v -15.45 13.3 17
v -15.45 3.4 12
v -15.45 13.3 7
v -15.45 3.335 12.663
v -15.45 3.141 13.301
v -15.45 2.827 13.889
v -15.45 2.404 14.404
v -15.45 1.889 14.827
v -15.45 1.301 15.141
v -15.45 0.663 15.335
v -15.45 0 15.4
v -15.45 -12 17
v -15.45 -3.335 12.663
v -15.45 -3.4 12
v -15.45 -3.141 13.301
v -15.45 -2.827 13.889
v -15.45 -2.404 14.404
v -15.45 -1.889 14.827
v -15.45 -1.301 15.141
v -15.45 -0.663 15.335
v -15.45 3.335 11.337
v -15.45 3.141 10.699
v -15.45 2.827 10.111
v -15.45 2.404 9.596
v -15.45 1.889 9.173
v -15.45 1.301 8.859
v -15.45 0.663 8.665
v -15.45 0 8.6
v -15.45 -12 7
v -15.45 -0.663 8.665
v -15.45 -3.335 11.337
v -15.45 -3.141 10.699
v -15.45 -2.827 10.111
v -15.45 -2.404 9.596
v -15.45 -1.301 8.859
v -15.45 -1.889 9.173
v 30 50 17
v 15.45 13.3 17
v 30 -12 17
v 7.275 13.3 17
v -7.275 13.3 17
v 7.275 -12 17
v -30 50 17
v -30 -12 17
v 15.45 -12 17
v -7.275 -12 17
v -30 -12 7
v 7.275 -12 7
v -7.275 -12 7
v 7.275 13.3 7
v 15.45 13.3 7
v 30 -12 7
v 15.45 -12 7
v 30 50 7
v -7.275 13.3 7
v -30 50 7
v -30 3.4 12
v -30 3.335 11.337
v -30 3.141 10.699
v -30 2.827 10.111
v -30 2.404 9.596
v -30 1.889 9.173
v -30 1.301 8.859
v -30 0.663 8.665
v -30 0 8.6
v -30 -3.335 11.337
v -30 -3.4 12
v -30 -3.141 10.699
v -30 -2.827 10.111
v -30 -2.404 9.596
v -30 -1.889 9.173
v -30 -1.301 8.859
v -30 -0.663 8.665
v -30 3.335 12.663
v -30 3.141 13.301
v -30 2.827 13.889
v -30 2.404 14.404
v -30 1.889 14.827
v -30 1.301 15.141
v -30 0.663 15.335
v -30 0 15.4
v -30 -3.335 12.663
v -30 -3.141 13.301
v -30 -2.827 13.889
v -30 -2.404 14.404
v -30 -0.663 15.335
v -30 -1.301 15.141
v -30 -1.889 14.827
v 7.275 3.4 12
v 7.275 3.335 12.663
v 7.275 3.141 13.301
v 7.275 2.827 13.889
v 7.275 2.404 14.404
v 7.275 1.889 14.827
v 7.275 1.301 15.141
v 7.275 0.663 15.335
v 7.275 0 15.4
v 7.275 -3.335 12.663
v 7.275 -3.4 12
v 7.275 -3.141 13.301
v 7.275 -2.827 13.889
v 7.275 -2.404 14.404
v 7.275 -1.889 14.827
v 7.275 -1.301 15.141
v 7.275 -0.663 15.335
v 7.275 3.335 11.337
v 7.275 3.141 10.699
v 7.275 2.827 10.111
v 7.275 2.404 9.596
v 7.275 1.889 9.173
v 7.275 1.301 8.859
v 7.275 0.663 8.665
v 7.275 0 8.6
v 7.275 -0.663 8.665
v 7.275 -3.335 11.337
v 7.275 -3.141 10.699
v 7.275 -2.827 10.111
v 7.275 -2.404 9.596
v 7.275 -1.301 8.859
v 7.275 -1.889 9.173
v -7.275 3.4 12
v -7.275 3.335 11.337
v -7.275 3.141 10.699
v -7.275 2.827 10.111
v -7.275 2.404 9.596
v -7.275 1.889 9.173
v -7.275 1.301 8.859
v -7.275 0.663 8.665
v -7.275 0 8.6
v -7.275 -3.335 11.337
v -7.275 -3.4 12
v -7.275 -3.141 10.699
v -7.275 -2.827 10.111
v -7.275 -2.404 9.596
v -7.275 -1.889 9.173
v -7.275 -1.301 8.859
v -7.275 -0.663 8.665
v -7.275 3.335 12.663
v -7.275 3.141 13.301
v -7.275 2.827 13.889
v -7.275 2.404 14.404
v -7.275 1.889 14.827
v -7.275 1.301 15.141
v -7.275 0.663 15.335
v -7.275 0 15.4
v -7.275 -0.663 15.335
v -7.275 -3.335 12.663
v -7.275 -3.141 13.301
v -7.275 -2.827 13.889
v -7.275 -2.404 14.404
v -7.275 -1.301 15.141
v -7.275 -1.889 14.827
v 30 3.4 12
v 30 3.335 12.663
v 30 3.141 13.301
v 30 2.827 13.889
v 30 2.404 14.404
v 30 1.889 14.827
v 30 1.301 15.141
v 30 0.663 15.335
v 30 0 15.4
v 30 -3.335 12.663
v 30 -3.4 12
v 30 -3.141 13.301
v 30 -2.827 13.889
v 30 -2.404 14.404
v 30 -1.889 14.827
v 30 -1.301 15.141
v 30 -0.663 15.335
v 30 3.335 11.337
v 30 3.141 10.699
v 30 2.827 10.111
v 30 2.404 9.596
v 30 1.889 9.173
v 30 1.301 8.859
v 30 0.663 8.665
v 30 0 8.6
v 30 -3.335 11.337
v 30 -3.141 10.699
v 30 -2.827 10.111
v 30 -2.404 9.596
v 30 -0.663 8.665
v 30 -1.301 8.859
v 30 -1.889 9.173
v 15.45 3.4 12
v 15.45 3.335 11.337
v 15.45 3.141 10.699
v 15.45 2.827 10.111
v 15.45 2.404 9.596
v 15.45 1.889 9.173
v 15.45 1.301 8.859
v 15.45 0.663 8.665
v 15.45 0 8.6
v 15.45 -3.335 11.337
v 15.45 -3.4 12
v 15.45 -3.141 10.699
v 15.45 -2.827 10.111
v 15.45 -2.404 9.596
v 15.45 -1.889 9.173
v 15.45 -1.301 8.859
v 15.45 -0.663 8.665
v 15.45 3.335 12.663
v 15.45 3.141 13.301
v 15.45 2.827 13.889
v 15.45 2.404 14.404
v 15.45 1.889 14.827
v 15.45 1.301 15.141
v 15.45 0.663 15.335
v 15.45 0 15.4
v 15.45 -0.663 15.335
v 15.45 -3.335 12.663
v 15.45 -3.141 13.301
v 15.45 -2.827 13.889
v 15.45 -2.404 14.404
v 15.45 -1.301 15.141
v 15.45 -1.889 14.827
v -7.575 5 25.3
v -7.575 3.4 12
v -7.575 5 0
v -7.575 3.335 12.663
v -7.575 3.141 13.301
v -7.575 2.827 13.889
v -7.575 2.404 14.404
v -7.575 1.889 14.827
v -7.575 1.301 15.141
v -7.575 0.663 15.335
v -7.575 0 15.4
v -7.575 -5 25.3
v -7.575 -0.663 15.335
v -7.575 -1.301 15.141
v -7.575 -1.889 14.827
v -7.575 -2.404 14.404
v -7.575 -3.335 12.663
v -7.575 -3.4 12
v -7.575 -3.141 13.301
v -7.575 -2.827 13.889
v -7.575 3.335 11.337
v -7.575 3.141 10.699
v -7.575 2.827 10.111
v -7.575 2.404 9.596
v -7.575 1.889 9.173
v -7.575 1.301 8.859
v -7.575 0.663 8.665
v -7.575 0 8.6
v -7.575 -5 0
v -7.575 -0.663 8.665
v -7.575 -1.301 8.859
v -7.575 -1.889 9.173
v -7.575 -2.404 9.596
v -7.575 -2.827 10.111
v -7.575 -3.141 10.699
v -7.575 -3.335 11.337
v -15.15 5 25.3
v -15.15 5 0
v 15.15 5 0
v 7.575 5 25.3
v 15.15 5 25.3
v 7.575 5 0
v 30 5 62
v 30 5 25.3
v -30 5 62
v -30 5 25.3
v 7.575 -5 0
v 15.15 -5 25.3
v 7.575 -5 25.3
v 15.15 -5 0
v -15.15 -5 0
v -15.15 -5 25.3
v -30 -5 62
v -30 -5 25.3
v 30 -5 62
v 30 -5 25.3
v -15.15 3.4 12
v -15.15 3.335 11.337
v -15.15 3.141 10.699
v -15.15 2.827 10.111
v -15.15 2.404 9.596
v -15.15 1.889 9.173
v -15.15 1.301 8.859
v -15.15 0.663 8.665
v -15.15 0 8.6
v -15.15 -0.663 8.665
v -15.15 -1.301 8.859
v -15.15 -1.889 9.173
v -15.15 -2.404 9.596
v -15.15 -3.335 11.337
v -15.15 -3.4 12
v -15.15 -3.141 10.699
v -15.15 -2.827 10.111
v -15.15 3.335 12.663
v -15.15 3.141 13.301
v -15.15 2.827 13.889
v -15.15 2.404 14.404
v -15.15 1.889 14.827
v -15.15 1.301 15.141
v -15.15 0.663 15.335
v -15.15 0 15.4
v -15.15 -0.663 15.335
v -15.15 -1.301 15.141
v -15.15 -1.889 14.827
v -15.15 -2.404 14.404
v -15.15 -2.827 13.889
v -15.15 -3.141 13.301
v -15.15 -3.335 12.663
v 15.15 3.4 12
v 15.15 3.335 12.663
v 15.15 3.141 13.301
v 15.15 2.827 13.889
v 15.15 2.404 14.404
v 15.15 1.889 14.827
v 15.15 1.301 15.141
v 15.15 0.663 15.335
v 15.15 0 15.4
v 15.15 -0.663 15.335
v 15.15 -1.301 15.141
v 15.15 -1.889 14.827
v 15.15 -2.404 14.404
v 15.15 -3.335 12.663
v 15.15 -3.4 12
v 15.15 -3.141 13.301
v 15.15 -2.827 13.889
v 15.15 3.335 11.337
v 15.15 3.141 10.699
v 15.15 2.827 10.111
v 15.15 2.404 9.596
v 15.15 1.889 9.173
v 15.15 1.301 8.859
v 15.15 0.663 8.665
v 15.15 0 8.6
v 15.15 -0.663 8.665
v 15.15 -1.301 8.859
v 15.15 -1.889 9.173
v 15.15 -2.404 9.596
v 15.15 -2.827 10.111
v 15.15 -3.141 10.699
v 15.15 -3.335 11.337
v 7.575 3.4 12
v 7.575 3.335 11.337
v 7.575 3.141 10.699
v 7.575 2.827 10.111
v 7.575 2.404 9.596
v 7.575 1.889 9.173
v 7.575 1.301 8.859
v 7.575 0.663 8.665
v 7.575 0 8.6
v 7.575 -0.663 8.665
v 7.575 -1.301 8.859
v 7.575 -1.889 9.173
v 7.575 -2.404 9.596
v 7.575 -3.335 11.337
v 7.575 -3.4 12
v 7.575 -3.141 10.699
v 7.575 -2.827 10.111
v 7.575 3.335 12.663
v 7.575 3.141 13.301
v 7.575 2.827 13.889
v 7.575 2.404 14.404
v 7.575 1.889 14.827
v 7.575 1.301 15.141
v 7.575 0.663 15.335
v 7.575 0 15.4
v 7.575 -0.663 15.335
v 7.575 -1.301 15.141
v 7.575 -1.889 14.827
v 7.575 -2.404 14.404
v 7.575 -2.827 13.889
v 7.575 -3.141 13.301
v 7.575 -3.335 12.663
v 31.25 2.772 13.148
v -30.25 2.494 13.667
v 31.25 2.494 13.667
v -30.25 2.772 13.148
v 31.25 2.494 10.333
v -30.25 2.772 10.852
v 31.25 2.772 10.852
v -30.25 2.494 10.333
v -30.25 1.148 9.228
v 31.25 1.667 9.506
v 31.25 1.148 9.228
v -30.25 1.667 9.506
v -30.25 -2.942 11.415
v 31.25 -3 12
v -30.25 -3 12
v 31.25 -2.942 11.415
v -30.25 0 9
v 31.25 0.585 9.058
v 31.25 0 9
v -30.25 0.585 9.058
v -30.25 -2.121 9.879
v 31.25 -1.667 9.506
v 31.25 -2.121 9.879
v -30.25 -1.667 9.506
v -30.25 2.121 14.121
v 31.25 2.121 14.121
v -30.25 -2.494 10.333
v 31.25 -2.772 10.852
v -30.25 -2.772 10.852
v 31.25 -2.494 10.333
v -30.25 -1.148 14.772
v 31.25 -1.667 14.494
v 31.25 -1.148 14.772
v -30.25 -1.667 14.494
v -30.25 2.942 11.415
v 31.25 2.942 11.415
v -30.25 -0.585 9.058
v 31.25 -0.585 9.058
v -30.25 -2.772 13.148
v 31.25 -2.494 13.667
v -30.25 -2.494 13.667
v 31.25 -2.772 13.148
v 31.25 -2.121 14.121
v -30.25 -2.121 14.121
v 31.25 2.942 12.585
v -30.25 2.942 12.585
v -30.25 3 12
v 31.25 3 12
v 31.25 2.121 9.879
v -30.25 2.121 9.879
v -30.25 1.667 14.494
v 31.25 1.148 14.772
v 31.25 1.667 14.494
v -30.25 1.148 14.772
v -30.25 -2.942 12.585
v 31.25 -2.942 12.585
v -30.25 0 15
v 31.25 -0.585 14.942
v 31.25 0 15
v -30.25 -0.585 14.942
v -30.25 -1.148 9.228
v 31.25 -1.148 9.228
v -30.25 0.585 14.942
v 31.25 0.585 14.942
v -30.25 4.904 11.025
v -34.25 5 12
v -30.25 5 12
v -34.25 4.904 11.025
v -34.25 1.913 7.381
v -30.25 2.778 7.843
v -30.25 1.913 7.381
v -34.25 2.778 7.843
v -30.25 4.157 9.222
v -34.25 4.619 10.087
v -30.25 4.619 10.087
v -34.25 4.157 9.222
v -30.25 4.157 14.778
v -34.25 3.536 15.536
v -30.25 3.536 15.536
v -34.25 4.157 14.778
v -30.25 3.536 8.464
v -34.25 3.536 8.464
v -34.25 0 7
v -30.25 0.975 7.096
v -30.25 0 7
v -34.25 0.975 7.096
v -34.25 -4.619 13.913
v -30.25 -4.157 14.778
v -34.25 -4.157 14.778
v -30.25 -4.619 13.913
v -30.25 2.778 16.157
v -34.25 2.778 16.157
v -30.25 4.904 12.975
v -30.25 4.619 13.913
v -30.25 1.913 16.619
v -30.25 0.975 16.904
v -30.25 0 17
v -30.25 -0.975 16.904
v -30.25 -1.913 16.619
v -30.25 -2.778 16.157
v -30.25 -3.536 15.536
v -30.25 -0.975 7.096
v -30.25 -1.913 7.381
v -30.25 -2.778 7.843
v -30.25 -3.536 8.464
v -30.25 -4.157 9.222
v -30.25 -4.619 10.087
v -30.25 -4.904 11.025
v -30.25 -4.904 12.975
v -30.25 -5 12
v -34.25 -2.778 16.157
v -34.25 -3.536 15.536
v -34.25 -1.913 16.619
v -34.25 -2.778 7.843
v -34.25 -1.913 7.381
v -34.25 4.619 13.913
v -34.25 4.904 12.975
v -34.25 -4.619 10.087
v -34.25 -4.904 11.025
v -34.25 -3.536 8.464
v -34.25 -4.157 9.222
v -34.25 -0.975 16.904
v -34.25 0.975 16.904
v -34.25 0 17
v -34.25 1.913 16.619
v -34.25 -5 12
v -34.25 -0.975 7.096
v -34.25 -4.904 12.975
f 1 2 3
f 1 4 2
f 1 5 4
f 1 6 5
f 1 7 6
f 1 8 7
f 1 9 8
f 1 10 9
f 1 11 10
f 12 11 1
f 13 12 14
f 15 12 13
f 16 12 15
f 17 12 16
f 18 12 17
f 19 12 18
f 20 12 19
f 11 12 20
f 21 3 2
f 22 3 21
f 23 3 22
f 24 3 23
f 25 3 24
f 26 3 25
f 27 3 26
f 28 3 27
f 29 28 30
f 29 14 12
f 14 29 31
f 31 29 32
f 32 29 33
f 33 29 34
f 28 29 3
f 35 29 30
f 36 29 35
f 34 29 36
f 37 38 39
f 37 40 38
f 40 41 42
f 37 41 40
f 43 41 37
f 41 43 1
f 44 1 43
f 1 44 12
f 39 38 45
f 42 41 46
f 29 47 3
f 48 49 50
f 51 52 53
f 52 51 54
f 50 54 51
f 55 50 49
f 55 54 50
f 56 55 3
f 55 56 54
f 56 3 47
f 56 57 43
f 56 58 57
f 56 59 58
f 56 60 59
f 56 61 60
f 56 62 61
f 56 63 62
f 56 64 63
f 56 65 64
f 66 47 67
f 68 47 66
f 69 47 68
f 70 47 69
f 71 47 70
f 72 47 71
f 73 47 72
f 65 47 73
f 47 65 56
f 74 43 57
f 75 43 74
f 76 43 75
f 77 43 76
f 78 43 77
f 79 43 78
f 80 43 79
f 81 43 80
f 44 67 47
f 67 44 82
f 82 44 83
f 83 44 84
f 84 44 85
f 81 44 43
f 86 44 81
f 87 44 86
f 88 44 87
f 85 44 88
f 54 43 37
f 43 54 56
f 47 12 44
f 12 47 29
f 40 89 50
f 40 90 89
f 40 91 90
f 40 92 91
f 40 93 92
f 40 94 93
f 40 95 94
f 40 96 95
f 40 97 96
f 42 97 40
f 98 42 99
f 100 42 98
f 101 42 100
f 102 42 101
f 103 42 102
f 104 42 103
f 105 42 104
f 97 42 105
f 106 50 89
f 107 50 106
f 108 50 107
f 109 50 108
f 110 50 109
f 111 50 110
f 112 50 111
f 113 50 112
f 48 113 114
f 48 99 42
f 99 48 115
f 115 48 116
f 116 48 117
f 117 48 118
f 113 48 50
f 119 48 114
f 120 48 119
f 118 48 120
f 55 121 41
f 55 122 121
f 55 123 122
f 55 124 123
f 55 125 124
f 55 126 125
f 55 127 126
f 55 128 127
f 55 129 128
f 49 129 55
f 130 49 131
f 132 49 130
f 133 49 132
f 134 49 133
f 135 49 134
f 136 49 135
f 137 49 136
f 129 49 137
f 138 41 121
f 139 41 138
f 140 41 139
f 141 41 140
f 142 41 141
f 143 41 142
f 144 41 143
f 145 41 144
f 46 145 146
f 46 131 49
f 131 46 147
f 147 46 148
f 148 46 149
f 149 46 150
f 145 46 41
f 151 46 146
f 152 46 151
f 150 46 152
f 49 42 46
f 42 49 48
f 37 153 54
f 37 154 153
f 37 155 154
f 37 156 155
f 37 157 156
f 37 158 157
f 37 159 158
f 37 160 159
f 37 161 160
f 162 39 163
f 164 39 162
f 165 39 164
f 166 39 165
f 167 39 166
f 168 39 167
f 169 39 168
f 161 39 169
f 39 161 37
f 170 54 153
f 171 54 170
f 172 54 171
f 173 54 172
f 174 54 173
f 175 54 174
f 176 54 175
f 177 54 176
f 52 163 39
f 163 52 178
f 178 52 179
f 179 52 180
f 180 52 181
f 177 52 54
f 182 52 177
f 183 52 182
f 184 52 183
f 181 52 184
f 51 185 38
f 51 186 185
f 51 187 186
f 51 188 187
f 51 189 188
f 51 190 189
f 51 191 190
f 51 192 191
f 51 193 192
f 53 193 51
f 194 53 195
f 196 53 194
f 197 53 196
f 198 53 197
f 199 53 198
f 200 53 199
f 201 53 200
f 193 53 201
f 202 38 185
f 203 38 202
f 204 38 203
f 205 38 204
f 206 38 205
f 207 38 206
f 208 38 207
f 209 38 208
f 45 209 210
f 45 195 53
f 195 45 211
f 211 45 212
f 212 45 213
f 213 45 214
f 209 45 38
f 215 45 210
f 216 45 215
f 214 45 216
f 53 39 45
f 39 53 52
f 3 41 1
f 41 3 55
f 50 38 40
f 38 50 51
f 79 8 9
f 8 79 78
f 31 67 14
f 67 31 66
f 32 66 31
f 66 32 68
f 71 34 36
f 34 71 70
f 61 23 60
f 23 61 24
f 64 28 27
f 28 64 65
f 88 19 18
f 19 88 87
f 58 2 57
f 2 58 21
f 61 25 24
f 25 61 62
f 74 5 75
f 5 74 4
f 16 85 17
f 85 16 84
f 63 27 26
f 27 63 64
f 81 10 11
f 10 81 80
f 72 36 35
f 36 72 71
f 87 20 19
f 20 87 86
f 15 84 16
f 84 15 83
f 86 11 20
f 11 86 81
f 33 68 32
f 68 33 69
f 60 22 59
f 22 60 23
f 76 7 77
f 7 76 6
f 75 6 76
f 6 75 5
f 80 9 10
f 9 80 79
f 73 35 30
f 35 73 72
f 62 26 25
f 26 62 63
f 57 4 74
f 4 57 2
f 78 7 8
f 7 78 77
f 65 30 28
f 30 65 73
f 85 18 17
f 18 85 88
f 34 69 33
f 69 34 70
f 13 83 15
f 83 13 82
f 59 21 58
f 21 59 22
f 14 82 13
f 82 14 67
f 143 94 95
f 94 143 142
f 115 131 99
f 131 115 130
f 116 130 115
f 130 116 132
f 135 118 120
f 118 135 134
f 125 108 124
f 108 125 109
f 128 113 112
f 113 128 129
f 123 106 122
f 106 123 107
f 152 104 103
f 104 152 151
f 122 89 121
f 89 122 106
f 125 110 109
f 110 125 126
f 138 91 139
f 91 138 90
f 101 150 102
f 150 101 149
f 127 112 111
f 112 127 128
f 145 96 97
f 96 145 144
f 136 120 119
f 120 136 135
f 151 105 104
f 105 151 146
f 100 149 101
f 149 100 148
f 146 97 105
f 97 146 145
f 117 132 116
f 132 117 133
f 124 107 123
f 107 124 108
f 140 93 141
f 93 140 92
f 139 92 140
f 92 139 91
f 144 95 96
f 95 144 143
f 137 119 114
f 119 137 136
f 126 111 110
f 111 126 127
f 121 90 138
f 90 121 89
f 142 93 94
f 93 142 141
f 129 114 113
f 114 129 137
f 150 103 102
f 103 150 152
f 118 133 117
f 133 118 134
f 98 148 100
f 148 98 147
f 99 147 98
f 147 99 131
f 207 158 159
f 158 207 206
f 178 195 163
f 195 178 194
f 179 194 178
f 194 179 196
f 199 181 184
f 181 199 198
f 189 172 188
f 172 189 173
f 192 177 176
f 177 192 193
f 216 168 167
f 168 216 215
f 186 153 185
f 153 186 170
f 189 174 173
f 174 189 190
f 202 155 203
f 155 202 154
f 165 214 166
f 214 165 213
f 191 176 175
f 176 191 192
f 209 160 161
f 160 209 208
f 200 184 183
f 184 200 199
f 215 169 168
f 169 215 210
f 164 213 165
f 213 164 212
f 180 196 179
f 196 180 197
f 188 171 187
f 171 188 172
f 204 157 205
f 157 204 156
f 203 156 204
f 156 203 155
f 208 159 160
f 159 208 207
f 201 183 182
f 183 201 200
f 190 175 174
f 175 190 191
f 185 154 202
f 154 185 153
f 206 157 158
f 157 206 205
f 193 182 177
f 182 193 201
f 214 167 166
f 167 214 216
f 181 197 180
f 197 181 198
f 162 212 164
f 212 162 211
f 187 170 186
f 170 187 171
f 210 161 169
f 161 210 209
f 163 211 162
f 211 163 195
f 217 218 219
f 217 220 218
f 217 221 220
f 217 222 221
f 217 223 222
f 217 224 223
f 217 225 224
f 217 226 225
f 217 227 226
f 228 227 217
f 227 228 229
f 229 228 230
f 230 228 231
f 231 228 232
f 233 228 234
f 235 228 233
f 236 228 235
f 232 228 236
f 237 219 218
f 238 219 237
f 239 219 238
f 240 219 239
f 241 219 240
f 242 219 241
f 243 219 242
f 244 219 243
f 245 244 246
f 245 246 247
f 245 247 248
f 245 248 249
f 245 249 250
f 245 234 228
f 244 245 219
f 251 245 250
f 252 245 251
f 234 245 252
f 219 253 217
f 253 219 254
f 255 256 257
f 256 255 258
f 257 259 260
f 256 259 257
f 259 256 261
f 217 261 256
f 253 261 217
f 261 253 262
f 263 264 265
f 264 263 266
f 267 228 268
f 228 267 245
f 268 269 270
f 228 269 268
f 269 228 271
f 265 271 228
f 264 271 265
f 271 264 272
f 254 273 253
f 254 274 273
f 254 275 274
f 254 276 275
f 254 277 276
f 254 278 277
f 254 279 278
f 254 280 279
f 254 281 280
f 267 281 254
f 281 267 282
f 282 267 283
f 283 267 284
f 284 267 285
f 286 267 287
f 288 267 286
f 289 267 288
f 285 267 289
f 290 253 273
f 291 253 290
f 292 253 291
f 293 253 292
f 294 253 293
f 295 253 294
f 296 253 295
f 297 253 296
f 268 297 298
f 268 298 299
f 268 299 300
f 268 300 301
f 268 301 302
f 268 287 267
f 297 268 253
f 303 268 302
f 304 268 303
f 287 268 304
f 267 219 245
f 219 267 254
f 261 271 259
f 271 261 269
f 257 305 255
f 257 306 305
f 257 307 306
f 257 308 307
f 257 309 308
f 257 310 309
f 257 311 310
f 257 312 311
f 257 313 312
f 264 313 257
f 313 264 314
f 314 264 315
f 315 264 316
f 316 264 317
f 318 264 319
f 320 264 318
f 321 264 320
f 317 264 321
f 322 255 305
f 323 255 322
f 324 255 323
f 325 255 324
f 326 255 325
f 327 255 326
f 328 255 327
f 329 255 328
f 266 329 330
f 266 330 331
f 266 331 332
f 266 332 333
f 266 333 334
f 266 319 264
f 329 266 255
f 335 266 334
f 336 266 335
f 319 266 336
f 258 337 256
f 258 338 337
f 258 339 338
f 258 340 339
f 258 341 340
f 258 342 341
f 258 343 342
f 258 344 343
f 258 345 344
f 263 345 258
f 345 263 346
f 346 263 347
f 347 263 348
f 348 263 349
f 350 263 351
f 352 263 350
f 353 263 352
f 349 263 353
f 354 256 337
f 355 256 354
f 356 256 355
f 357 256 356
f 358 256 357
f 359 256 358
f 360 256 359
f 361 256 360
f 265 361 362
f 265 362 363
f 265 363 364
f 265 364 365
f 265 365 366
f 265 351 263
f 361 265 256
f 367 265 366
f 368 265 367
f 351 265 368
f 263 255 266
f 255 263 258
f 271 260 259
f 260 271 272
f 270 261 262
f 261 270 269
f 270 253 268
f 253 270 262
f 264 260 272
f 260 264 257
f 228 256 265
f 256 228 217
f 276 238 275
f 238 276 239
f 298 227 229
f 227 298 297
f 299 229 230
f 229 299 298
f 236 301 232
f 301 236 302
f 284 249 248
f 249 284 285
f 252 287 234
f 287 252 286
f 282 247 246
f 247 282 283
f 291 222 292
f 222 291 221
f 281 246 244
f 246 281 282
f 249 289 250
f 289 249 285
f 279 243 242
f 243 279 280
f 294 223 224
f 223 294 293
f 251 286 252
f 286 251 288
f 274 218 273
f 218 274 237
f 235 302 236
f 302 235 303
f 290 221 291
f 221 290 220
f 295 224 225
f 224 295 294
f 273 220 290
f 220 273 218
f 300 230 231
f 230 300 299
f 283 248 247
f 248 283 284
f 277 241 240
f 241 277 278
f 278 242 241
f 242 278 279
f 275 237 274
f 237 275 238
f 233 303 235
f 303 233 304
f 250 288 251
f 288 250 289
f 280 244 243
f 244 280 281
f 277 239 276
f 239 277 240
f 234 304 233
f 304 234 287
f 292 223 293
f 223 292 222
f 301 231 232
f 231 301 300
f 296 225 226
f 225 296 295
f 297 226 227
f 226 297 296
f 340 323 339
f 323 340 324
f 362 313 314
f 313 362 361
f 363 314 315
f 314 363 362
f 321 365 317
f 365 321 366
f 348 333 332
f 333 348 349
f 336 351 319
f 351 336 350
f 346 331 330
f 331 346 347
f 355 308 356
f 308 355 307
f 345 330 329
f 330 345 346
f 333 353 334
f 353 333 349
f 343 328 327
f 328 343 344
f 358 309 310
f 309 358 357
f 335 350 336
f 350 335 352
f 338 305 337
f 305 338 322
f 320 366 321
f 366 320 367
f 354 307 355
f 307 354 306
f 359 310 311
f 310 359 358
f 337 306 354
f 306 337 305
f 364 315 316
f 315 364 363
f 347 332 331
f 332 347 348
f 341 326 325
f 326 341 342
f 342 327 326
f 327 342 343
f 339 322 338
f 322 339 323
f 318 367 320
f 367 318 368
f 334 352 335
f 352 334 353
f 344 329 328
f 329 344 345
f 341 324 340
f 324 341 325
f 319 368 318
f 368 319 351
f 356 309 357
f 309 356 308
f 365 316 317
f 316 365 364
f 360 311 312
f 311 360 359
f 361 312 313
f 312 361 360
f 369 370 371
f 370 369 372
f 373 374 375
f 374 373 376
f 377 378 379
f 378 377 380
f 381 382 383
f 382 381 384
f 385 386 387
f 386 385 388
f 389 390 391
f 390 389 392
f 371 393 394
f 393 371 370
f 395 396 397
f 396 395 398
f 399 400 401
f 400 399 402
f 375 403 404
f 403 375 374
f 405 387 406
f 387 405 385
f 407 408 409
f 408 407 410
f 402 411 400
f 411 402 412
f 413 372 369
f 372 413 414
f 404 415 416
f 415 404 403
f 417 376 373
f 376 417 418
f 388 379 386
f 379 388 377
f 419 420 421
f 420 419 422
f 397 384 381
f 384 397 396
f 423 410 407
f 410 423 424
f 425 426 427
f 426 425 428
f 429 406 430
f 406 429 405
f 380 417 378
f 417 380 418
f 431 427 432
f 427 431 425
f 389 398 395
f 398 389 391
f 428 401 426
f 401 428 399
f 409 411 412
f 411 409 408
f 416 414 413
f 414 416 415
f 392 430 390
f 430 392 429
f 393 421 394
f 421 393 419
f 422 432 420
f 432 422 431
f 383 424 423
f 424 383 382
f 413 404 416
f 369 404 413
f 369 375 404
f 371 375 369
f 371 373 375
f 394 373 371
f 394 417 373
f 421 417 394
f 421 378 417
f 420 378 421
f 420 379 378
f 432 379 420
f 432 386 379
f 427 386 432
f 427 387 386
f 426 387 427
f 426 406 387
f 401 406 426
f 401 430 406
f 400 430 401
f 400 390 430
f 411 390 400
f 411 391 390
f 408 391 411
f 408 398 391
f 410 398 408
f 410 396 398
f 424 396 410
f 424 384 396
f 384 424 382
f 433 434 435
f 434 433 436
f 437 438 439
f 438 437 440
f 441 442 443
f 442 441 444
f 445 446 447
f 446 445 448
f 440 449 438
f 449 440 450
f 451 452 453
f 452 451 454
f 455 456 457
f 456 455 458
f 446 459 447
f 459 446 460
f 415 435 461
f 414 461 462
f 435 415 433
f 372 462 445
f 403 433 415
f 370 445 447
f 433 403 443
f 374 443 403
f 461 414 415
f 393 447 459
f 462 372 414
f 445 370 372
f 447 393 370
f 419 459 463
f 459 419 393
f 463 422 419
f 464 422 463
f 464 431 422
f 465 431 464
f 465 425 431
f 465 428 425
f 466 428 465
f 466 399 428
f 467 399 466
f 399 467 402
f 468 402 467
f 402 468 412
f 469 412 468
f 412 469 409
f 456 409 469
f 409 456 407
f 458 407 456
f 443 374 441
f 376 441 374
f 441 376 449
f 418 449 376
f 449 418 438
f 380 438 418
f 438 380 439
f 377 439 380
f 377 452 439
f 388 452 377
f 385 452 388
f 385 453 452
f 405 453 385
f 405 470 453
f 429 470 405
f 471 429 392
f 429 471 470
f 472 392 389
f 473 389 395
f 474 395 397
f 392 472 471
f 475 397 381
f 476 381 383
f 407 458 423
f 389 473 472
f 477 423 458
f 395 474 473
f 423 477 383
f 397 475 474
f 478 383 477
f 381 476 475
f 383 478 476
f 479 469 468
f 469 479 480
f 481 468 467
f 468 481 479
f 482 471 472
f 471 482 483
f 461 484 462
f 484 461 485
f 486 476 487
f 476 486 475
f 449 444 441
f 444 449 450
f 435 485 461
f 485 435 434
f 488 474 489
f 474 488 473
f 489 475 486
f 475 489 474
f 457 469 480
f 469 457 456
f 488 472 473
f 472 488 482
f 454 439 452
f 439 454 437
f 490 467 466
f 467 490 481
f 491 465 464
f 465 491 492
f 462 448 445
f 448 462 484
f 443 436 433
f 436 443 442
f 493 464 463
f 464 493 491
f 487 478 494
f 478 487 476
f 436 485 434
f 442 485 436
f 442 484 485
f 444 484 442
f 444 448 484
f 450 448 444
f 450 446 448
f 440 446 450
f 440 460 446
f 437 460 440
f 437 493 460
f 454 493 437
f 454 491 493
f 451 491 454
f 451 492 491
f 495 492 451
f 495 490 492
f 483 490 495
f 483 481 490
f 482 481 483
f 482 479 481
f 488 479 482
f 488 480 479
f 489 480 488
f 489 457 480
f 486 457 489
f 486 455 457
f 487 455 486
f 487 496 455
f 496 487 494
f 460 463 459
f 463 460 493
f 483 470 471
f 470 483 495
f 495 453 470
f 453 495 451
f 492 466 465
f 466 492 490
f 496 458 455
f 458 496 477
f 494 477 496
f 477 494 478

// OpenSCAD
$fn = 32;

// ------------------------------------------------------------------------
// Butt hinge: hinge 60 mm, leaf swung 270 deg
// Every part is its own module, assembly() places every instance.
// ------------------------------------------------------------------------

// --- part 1 ---
module hinge_base() {
  difference() {
    union() {
      translate([-30, -12, -5]) cube([14.55, 62, 10]);
      translate([-7.275, -12, -5]) cube([14.55, 62, 10]);
      translate([15.45, -12, -5]) cube([14.55, 62, 10]);
      translate([-30, 13.3, -5]) cube([60, 36.7, 10]);
    }
    translate([-22.725, 0, 0]) rotate([0, 90, 0]) cylinder(h = 16.55, d = 6.8, center = true);
    translate([0, 0, 0]) rotate([0, 90, 0]) cylinder(h = 16.55, d = 6.8, center = true);
    translate([22.725, 0, 0]) rotate([0, 90, 0]) cylinder(h = 16.55, d = 6.8, center = true);
  }
}

// --- part 2 ---
module hinge_mover() {
  difference() {
    union() {
      translate([-15.15, -50, -5]) cube([7.575, 62, 10]);
      translate([7.575, -50, -5]) cube([7.575, 62, 10]);
      translate([-30, -50, -5]) cube([60, 36.7, 10]);
    }
    translate([-11.362, 0, 0]) rotate([0, 90, 0]) cylinder(h = 9.575, d = 6.8, center = true);
    translate([11.362, 0, 0]) rotate([0, 90, 0]) cylinder(h = 9.575, d = 6.8, center = true);
  }
}

// --- part 3 ---
module hinge_pin() {
  rotate([0, 90, 0]) cylinder(h = 62.5, d = 6, center = true);
  translate([-34.25, 0, 0]) rotate([0, 90, 0]) cylinder(h = 4, d = 10);
}

// --- assembly ---
module assembly() {
  color([0.80, 0.24, 0.20]) translate([0, 0, 12]) rotate([0, 0, 0]) hinge_base();
  color([0.20, 0.45, 0.75]) translate([0, 0, 12]) rotate([270, 0, 0]) hinge_mover();
  color([0.25, 0.62, 0.32]) translate([0, 0, 12]) rotate([0, 0, 0]) hinge_pin();
}

assembly();
